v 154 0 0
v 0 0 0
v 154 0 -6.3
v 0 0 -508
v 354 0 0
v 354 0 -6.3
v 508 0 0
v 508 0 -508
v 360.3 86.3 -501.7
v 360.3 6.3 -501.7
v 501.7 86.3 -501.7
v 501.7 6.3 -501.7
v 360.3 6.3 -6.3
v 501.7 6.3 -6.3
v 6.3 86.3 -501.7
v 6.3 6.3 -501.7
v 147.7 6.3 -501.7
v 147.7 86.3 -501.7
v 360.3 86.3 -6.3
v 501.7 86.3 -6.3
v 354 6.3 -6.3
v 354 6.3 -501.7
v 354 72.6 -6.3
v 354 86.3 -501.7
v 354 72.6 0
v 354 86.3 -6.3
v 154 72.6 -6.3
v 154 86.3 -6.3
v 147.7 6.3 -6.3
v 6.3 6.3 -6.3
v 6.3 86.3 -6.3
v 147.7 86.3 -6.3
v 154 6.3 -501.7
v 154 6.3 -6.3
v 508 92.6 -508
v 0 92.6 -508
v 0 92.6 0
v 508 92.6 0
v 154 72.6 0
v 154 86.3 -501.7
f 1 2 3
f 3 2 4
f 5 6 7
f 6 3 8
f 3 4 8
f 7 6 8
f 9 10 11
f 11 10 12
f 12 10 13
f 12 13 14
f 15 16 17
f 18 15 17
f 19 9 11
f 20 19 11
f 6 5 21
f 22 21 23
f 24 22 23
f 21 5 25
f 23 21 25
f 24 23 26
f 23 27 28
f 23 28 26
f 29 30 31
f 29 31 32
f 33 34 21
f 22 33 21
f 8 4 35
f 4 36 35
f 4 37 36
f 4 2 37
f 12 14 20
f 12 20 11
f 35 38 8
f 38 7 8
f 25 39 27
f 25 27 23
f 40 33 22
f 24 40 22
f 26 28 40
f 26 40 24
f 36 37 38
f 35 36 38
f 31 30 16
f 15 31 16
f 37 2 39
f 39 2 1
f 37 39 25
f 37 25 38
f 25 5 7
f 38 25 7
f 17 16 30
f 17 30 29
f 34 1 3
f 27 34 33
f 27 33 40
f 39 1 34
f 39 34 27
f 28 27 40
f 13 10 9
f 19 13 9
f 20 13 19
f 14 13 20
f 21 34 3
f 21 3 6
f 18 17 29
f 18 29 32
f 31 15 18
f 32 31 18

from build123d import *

# Parameters (mm, degrees)
SKETCH3_W               = 508
SKETCH3_H               = 508
BOSS_EXTRUDE1_DEPTH     = 6.3
SKETCH4_W               = 508
SKETCH4_H               = 508
SKETCH4_W_2             = 495.4
SKETCH4_H_2             = 495.4
BOSS_EXTRUDE2_DEPTH     = 80
SKETCH5_W               = 508
SKETCH5_H               = 508
BOSS_EXTRUDE3_DEPTH     = 6.3
SKETCH6_W               = 200
SKETCH6_H               = 72.6
CUT_EXTRUDE2_DEPTH      = 1
CUT_EXTRUDE2_DEPTH_BACK = 6.3
SKETCH8_W               = 6.3
SKETCH8_H               = 92.6
BOSS_EXTRUDE4_DEPTH     = 508


with BuildPart() as part:
    # Sketch3 → Boss-Extrude1 (new body)
    with BuildSketch(Plane(origin=(0, 0, 0), x_dir=(1, 0, 0), z_dir=(0, 1, 0))):
        with Locations((254, 254)):
            Rectangle(SKETCH3_W, SKETCH3_H)
    extrude(amount=BOSS_EXTRUDE1_DEPTH)

    # Sketch4 → Boss-Extrude2 (add)
    with BuildSketch(Plane(origin=(0, 6.3, 0), x_dir=(1, 0, 0), z_dir=(0, 1, 0))):
        with Locations((254, 254)):
            Rectangle(SKETCH4_W, SKETCH4_H)
        with Locations((254, 254)):
            Rectangle(SKETCH4_W_2, SKETCH4_H_2, mode=Mode.SUBTRACT)
    extrude(amount=BOSS_EXTRUDE2_DEPTH)

    # Sketch5 → Boss-Extrude3 (add)
    with BuildSketch(Plane(origin=(0, 86.3, 0), x_dir=(1, 0, 0), z_dir=(0, 1, 0))):
        with Locations((254, 254)):
            Rectangle(SKETCH5_W, SKETCH5_H)
    extrude(amount=BOSS_EXTRUDE3_DEPTH)

    # Sketch6 → Cut-Extrude2 (cut, two sides)
    with BuildSketch(Plane.XY) as cut_extrude2_sk:
        with Locations((254, 36.3)):
            Rectangle(SKETCH6_W, SKETCH6_H)
    extrude(amount=CUT_EXTRUDE2_DEPTH, mode=Mode.SUBTRACT)
    extrude(cut_extrude2_sk.sketch, amount=-CUT_EXTRUDE2_DEPTH_BACK, mode=Mode.SUBTRACT)

    # Sketch8 → Boss-Extrude4 (add)
    with BuildSketch(Plane.XY):
        with Locations((150.85, 46.3)):
            Rectangle(SKETCH8_W, SKETCH8_H)
        with Locations((357.15, 46.3)):
            Rectangle(SKETCH8_W, SKETCH8_H)
    extrude(amount=-BOSS_EXTRUDE4_DEPTH)


solid = part.part
